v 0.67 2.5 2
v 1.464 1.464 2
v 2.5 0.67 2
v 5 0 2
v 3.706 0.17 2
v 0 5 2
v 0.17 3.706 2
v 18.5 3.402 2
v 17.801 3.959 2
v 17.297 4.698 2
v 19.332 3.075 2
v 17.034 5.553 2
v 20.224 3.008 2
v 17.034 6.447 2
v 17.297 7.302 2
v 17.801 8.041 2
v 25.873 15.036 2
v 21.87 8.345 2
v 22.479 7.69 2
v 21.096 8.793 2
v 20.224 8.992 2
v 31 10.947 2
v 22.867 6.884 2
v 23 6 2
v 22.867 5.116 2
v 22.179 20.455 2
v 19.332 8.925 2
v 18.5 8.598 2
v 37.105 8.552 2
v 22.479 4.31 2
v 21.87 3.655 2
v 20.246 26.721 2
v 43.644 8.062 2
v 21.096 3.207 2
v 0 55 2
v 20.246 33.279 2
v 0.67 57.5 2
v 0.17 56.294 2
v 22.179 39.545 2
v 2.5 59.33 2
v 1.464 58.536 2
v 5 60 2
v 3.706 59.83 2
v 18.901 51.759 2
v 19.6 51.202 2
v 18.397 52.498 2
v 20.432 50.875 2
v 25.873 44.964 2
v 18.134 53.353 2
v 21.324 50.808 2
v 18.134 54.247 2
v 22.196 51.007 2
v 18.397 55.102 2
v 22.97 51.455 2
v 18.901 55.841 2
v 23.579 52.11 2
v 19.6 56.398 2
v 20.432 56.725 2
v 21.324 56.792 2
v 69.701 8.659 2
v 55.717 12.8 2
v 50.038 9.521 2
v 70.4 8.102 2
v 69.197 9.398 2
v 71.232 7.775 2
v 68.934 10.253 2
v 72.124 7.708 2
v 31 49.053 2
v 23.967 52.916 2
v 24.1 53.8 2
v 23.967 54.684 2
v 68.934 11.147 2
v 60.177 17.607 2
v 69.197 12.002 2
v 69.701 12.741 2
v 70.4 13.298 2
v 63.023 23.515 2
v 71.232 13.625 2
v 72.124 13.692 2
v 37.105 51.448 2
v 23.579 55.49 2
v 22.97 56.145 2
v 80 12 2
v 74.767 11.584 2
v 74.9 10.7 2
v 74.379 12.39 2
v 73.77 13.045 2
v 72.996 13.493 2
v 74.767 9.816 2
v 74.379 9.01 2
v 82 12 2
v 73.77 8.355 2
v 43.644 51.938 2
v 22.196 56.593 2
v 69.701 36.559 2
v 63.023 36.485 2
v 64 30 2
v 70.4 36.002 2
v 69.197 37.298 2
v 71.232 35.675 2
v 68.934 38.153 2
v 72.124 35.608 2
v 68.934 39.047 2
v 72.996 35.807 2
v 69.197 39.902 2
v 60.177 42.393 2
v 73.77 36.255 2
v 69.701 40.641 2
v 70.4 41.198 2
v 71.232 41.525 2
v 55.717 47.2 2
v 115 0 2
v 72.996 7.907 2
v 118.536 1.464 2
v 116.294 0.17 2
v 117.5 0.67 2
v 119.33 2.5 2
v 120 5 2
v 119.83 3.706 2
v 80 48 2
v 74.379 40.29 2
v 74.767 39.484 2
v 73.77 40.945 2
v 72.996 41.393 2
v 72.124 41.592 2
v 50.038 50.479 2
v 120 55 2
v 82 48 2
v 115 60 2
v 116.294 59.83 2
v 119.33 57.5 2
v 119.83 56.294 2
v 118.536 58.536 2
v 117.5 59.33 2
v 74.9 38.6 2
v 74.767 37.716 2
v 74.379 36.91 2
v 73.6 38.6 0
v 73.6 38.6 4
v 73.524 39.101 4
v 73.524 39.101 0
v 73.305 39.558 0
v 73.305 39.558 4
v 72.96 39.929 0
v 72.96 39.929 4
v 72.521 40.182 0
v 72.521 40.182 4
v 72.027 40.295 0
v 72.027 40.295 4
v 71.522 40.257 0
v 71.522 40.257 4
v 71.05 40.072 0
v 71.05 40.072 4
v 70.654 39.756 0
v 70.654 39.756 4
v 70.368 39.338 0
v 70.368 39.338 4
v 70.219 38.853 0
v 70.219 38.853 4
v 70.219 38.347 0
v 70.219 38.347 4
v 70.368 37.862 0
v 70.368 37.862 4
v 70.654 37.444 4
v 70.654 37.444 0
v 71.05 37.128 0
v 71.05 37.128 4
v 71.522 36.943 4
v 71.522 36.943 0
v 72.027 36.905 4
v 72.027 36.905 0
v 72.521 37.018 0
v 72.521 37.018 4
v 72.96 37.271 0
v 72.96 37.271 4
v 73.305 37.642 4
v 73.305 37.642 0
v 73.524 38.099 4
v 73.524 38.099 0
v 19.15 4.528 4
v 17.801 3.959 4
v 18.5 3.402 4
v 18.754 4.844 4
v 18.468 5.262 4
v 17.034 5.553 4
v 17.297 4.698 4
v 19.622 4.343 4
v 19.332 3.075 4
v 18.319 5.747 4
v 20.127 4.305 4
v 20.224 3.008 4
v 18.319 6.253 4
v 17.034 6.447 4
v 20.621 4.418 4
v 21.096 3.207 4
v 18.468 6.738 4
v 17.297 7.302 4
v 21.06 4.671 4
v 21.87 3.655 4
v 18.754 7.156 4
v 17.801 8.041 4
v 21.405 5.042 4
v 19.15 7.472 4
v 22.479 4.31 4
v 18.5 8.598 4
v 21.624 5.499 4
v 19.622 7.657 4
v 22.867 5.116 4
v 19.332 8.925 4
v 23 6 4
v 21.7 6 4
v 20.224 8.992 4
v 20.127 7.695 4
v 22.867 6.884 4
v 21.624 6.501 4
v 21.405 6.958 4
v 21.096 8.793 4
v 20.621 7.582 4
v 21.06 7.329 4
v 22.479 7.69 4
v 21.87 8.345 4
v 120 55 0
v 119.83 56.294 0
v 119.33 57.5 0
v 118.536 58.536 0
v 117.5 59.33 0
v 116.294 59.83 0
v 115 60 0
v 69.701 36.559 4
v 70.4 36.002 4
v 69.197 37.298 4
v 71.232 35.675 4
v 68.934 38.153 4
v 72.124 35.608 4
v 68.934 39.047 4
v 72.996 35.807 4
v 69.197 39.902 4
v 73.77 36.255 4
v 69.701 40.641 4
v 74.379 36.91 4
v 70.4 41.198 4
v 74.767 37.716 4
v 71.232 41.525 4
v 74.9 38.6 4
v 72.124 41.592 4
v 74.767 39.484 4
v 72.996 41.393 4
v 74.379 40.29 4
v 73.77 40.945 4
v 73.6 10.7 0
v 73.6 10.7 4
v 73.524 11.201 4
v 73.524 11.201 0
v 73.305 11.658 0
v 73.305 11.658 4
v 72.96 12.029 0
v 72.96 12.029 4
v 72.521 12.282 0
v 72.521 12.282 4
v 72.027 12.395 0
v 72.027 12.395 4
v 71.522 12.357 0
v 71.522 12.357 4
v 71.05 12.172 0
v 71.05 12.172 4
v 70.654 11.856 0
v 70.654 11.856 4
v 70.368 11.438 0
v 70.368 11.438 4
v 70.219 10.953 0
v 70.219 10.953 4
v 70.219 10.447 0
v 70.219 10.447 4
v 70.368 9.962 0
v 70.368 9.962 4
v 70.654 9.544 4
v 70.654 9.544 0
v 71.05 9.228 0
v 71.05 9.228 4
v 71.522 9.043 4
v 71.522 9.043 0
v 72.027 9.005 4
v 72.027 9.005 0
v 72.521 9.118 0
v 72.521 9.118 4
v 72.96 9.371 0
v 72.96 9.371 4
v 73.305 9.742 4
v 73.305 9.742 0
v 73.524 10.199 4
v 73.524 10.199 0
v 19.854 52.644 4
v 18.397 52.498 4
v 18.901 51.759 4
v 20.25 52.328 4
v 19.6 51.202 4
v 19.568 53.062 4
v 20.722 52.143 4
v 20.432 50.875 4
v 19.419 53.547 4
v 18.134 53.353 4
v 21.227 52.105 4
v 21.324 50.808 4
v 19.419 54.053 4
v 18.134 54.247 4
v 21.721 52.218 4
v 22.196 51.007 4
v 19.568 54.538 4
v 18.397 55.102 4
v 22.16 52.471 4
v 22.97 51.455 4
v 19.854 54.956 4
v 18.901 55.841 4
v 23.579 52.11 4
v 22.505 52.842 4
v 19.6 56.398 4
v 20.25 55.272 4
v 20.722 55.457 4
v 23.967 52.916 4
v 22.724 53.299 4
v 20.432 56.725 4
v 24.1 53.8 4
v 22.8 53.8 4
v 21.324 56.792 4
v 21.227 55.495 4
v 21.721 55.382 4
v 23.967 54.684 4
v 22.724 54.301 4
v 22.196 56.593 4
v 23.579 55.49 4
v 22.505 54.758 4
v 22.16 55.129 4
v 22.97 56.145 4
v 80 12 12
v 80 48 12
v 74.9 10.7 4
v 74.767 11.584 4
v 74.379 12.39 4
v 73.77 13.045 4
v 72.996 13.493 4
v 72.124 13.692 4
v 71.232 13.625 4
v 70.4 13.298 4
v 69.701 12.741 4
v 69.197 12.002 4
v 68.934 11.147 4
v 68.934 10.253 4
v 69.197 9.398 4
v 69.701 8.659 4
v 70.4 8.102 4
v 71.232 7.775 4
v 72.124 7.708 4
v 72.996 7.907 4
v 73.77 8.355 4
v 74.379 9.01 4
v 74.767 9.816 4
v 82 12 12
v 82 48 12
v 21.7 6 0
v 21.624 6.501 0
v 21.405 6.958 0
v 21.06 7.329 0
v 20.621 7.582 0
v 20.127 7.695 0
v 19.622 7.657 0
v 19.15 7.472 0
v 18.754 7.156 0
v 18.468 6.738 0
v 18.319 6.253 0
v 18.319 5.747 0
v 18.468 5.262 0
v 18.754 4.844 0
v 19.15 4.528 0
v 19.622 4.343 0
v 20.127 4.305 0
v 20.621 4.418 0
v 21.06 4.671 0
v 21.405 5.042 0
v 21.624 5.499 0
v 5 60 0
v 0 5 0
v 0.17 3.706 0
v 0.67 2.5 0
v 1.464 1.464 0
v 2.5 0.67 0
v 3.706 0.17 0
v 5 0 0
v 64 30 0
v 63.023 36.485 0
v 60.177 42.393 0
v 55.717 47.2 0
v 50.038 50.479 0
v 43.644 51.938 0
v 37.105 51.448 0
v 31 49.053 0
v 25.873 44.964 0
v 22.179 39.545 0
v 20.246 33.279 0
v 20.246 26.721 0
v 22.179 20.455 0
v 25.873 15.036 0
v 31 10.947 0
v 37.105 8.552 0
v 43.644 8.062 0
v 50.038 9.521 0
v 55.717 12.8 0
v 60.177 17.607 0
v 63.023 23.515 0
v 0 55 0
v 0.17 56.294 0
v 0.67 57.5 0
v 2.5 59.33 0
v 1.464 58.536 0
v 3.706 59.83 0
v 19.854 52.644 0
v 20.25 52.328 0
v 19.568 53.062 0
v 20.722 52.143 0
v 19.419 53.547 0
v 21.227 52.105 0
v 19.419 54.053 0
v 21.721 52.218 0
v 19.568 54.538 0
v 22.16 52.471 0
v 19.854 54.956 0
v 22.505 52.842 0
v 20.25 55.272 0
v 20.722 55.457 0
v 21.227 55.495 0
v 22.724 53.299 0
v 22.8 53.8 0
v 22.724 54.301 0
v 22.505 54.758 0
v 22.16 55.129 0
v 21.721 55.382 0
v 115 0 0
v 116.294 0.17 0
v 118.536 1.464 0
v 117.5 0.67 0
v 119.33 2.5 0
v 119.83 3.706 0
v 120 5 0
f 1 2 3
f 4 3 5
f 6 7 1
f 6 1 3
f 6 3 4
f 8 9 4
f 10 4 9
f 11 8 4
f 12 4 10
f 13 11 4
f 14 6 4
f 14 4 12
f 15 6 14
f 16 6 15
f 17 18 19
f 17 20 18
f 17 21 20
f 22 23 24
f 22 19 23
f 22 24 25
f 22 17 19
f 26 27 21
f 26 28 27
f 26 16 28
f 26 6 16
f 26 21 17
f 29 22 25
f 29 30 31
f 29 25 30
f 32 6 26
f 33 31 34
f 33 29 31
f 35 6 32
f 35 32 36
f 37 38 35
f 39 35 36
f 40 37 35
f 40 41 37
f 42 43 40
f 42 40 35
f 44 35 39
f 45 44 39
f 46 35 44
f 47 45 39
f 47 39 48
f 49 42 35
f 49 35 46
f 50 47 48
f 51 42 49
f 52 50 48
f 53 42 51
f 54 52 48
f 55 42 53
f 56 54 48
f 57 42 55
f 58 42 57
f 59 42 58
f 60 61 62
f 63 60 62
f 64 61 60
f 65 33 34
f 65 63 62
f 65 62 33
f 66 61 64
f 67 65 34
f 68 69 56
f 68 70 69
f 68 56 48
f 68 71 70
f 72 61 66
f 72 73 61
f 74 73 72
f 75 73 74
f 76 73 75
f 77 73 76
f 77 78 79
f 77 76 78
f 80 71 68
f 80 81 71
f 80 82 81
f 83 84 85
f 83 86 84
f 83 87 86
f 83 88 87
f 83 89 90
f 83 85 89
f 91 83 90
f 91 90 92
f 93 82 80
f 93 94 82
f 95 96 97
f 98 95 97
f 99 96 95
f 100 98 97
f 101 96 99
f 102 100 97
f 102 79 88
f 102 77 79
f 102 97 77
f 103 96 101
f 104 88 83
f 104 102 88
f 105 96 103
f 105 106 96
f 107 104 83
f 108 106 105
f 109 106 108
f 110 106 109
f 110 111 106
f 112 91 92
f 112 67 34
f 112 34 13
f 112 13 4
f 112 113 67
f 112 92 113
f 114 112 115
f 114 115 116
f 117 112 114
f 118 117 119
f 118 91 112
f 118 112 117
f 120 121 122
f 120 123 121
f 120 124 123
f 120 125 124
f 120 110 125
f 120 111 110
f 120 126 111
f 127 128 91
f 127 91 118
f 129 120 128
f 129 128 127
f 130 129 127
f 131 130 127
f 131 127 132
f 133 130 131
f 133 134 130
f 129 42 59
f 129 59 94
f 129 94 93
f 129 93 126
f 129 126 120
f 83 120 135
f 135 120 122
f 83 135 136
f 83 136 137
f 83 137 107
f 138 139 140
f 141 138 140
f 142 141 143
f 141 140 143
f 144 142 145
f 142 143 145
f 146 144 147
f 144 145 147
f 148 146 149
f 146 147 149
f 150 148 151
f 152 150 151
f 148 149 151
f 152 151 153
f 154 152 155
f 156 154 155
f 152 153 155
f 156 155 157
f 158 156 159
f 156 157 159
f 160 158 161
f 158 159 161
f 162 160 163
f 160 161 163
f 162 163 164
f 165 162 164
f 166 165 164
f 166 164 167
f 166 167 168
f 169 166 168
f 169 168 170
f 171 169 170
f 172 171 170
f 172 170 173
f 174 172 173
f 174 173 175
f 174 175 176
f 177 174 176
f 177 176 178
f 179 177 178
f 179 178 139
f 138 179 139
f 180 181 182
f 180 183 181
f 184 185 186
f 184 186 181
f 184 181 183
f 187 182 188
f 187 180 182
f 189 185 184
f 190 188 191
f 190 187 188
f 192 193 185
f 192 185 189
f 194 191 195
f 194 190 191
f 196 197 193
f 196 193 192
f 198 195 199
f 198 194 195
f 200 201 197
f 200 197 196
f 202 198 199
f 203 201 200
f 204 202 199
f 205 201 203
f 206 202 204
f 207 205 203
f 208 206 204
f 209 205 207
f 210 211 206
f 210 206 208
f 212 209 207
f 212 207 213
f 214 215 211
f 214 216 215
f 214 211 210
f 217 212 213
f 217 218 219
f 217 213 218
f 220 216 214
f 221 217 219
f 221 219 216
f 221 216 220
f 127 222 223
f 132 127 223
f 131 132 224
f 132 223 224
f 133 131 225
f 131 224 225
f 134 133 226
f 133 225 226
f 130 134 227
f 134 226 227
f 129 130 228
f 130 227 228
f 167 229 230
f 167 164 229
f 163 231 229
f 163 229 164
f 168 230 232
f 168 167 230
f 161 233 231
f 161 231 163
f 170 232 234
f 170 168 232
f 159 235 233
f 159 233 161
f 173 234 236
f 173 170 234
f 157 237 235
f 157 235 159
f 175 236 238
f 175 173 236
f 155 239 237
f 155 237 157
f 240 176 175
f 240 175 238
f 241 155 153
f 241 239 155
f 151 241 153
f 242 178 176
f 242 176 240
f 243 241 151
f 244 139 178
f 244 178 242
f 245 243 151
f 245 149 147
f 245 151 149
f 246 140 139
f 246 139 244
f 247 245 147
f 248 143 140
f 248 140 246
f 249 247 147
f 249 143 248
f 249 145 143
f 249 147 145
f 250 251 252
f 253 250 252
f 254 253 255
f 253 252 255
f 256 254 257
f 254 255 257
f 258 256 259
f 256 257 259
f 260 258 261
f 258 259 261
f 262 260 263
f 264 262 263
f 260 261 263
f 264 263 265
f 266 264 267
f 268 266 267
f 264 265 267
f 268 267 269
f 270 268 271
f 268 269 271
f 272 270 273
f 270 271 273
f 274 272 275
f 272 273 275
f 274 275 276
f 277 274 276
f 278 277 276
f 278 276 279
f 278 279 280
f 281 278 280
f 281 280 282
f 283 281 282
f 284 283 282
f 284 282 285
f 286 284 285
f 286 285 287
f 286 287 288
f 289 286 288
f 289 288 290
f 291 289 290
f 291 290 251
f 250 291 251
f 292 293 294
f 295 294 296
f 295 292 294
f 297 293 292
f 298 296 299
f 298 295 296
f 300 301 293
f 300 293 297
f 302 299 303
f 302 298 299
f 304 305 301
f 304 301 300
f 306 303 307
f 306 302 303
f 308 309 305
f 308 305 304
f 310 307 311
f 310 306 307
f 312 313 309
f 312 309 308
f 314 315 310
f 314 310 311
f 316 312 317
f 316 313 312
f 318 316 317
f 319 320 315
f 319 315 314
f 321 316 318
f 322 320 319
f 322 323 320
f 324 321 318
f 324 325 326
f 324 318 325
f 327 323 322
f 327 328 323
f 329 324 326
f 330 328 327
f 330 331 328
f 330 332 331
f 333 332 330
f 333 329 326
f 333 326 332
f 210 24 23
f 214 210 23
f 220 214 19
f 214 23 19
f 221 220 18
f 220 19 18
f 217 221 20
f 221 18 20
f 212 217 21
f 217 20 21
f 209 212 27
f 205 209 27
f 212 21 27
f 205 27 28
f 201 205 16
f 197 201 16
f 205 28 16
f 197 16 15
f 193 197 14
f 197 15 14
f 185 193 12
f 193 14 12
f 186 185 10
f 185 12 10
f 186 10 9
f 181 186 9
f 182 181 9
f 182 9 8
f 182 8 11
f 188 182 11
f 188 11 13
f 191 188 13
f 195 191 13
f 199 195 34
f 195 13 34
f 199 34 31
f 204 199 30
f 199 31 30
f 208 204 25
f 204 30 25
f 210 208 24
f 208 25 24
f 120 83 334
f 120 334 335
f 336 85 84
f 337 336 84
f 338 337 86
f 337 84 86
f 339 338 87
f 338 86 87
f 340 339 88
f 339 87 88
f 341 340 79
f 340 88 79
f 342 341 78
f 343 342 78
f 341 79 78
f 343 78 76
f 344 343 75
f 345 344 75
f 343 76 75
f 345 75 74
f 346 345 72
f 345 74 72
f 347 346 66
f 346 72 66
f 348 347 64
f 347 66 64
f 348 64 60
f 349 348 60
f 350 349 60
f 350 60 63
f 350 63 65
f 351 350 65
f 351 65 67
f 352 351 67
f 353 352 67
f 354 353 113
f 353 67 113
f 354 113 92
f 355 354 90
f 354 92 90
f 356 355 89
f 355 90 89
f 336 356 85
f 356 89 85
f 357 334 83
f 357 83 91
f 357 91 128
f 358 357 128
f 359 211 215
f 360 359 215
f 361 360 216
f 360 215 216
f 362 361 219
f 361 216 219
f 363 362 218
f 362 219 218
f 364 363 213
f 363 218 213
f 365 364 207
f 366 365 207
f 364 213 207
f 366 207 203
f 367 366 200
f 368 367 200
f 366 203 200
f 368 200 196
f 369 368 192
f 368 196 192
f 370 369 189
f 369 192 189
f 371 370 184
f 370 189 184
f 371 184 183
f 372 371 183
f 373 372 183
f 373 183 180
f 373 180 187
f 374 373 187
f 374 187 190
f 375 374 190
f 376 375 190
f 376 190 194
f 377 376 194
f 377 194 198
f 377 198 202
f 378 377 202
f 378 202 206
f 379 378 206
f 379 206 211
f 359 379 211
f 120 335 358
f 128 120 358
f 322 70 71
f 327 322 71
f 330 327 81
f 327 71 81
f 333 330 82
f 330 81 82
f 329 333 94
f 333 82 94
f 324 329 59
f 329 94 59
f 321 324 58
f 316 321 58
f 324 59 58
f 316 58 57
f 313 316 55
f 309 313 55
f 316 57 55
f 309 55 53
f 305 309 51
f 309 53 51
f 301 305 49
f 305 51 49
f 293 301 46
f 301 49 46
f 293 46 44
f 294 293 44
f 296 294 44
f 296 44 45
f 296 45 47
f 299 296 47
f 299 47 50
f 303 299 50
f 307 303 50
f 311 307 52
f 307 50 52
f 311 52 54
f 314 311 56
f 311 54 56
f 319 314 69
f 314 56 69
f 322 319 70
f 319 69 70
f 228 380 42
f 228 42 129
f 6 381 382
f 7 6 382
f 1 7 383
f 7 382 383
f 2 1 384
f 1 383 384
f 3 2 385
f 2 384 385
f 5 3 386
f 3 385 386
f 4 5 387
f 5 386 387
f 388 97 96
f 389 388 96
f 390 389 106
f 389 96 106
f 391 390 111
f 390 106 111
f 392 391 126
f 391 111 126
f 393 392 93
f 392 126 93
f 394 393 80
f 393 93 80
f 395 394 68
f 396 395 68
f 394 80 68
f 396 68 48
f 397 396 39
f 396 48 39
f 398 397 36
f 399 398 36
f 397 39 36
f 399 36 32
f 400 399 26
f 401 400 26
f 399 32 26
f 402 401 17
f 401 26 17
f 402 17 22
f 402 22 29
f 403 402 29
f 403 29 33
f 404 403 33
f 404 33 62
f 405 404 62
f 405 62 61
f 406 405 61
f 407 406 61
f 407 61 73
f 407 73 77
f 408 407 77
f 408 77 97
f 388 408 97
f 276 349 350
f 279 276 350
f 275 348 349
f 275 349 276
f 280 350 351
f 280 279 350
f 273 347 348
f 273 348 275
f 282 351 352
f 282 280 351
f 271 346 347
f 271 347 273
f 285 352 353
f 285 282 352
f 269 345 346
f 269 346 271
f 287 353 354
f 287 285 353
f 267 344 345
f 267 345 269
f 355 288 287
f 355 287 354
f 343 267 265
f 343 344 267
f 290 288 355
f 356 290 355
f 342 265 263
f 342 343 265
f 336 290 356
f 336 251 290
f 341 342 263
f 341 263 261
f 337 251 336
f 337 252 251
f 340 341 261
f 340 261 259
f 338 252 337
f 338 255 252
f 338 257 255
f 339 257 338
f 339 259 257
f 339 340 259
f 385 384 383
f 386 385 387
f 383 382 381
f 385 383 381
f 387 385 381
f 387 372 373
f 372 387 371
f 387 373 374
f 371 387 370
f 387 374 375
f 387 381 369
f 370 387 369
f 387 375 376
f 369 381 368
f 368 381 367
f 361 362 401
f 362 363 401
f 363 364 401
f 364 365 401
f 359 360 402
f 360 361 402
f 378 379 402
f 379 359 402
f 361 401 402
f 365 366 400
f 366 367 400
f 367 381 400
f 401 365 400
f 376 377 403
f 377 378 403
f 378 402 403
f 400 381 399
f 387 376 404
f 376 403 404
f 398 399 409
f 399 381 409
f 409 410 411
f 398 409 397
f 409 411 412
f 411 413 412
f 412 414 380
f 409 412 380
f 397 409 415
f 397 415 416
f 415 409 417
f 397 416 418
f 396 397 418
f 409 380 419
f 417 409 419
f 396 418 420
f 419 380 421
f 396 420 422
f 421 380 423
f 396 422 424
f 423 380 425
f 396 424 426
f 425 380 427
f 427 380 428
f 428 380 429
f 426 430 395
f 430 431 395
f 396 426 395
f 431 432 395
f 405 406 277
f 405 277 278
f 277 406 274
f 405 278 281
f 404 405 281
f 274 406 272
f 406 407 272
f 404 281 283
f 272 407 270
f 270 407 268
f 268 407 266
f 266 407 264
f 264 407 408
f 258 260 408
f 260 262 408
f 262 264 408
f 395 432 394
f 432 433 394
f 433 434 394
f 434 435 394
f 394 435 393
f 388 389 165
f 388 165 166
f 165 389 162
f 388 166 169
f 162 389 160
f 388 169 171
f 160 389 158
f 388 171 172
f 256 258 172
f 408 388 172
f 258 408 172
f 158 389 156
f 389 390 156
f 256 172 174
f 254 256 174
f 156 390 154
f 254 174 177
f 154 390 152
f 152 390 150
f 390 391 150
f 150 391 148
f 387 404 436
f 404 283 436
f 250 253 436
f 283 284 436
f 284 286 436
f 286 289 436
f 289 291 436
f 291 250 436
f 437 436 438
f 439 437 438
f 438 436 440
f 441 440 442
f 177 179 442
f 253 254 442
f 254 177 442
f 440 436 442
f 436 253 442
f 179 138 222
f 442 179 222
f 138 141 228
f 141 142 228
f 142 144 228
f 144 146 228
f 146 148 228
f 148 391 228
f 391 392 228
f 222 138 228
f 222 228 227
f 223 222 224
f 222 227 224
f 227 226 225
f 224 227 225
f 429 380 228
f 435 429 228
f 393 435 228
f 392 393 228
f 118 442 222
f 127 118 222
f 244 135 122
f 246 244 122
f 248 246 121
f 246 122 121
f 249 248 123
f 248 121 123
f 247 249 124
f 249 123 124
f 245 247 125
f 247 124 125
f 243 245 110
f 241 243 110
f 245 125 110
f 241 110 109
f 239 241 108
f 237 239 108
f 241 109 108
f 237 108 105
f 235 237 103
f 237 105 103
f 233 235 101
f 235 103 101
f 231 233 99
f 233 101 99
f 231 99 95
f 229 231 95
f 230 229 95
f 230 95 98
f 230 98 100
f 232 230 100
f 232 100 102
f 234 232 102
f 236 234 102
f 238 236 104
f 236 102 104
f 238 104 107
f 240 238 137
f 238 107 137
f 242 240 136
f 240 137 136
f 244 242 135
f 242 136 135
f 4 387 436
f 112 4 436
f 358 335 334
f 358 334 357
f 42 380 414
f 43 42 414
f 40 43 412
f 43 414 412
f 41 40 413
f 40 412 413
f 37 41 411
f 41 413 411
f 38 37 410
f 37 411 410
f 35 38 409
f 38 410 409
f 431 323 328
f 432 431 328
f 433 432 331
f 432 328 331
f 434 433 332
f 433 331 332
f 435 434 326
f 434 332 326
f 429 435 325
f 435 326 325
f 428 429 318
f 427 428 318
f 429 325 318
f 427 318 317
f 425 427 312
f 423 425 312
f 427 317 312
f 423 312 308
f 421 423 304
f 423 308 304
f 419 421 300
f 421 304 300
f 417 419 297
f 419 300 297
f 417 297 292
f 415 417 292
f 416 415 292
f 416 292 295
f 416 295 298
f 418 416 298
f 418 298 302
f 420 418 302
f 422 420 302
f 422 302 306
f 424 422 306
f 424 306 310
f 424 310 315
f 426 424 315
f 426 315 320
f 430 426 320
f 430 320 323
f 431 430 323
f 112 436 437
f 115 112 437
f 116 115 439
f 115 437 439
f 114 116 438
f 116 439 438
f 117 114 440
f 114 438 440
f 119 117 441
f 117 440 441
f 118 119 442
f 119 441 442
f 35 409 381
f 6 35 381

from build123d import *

# Parameters (mm, degrees)
PAD_DEPTH       = 2
SKETCH001_R     = 3
PAD001_DEPTH    = 2
SKETCH002_R     = 1.7
POCKET_DEPTH    = 5
SKETCH003_W     = 2
SKETCH003_H     = 36
PAD002_DEPTH    = 10
SKETCH004_R     = 22
POCKET001_DEPTH = 5


with BuildPart() as part:
    # Sketch → Pad (new body)
    with BuildSketch(Plane.XY):
        with BuildLine():
            Line((4.999993, 0), (115.000007, 0))
            ThreePointArc((115.000007, 0), (118.535542, 1.464474), (120, 5.000016))
            Line((120, 5.000016), (120, 54.999983))
            ThreePointArc((120, 54.999983), (118.535543, 58.535525), (115.000007, 60))
            Line((4.999993, 60), (115.000007, 60))
            ThreePointArc((4.999993, 60), (1.464457, 58.535525), (0, 54.999983))
            Line((0, 54.999983), (0, 5.000016))
            ThreePointArc((0, 5.000016), (1.464458, 1.464474), (4.999993, 0))
        make_face()
    extrude(amount=PAD_DEPTH)

    # Sketch001 → Pad001 (new body)
    with BuildSketch(Plane.XY.offset(2)):
        with Locations((20, 6)):
            Circle(SKETCH001_R)
        with Locations((71.9, 10.7)):
            Circle(SKETCH001_R)
        with Locations((71.9, 38.6)):
            Circle(SKETCH001_R)
        with Locations((21.1, 53.8)):
            Circle(SKETCH001_R)
    extrude(amount=PAD001_DEPTH)

    # Sketch002 → Pocket (cut)
    with BuildSketch(Plane.XY.offset(4)):
        with Locations((20, 6)):
            Circle(SKETCH002_R)
        with Locations((71.9, 10.7)):
            Circle(SKETCH002_R)
        with Locations((71.9, 38.6)):
            Circle(SKETCH002_R)
        with Locations((21.1, 53.8)):
            Circle(SKETCH002_R)
    extrude(amount=-POCKET_DEPTH, mode=Mode.SUBTRACT)

    # Sketch003 → Pad002 (new body)
    with BuildSketch(Plane.XY.offset(2)):
        with Locations((81, 30)):
            Rectangle(SKETCH003_W, SKETCH003_H)
    extrude(amount=PAD002_DEPTH)

    # Sketch004 → Pocket001 (cut)
    with BuildSketch(Plane.XY.offset(2)):
        with Locations((42, 30)):
            Circle(SKETCH004_R)
    extrude(amount=-POCKET001_DEPTH, mode=Mode.SUBTRACT)


solid = part.part
